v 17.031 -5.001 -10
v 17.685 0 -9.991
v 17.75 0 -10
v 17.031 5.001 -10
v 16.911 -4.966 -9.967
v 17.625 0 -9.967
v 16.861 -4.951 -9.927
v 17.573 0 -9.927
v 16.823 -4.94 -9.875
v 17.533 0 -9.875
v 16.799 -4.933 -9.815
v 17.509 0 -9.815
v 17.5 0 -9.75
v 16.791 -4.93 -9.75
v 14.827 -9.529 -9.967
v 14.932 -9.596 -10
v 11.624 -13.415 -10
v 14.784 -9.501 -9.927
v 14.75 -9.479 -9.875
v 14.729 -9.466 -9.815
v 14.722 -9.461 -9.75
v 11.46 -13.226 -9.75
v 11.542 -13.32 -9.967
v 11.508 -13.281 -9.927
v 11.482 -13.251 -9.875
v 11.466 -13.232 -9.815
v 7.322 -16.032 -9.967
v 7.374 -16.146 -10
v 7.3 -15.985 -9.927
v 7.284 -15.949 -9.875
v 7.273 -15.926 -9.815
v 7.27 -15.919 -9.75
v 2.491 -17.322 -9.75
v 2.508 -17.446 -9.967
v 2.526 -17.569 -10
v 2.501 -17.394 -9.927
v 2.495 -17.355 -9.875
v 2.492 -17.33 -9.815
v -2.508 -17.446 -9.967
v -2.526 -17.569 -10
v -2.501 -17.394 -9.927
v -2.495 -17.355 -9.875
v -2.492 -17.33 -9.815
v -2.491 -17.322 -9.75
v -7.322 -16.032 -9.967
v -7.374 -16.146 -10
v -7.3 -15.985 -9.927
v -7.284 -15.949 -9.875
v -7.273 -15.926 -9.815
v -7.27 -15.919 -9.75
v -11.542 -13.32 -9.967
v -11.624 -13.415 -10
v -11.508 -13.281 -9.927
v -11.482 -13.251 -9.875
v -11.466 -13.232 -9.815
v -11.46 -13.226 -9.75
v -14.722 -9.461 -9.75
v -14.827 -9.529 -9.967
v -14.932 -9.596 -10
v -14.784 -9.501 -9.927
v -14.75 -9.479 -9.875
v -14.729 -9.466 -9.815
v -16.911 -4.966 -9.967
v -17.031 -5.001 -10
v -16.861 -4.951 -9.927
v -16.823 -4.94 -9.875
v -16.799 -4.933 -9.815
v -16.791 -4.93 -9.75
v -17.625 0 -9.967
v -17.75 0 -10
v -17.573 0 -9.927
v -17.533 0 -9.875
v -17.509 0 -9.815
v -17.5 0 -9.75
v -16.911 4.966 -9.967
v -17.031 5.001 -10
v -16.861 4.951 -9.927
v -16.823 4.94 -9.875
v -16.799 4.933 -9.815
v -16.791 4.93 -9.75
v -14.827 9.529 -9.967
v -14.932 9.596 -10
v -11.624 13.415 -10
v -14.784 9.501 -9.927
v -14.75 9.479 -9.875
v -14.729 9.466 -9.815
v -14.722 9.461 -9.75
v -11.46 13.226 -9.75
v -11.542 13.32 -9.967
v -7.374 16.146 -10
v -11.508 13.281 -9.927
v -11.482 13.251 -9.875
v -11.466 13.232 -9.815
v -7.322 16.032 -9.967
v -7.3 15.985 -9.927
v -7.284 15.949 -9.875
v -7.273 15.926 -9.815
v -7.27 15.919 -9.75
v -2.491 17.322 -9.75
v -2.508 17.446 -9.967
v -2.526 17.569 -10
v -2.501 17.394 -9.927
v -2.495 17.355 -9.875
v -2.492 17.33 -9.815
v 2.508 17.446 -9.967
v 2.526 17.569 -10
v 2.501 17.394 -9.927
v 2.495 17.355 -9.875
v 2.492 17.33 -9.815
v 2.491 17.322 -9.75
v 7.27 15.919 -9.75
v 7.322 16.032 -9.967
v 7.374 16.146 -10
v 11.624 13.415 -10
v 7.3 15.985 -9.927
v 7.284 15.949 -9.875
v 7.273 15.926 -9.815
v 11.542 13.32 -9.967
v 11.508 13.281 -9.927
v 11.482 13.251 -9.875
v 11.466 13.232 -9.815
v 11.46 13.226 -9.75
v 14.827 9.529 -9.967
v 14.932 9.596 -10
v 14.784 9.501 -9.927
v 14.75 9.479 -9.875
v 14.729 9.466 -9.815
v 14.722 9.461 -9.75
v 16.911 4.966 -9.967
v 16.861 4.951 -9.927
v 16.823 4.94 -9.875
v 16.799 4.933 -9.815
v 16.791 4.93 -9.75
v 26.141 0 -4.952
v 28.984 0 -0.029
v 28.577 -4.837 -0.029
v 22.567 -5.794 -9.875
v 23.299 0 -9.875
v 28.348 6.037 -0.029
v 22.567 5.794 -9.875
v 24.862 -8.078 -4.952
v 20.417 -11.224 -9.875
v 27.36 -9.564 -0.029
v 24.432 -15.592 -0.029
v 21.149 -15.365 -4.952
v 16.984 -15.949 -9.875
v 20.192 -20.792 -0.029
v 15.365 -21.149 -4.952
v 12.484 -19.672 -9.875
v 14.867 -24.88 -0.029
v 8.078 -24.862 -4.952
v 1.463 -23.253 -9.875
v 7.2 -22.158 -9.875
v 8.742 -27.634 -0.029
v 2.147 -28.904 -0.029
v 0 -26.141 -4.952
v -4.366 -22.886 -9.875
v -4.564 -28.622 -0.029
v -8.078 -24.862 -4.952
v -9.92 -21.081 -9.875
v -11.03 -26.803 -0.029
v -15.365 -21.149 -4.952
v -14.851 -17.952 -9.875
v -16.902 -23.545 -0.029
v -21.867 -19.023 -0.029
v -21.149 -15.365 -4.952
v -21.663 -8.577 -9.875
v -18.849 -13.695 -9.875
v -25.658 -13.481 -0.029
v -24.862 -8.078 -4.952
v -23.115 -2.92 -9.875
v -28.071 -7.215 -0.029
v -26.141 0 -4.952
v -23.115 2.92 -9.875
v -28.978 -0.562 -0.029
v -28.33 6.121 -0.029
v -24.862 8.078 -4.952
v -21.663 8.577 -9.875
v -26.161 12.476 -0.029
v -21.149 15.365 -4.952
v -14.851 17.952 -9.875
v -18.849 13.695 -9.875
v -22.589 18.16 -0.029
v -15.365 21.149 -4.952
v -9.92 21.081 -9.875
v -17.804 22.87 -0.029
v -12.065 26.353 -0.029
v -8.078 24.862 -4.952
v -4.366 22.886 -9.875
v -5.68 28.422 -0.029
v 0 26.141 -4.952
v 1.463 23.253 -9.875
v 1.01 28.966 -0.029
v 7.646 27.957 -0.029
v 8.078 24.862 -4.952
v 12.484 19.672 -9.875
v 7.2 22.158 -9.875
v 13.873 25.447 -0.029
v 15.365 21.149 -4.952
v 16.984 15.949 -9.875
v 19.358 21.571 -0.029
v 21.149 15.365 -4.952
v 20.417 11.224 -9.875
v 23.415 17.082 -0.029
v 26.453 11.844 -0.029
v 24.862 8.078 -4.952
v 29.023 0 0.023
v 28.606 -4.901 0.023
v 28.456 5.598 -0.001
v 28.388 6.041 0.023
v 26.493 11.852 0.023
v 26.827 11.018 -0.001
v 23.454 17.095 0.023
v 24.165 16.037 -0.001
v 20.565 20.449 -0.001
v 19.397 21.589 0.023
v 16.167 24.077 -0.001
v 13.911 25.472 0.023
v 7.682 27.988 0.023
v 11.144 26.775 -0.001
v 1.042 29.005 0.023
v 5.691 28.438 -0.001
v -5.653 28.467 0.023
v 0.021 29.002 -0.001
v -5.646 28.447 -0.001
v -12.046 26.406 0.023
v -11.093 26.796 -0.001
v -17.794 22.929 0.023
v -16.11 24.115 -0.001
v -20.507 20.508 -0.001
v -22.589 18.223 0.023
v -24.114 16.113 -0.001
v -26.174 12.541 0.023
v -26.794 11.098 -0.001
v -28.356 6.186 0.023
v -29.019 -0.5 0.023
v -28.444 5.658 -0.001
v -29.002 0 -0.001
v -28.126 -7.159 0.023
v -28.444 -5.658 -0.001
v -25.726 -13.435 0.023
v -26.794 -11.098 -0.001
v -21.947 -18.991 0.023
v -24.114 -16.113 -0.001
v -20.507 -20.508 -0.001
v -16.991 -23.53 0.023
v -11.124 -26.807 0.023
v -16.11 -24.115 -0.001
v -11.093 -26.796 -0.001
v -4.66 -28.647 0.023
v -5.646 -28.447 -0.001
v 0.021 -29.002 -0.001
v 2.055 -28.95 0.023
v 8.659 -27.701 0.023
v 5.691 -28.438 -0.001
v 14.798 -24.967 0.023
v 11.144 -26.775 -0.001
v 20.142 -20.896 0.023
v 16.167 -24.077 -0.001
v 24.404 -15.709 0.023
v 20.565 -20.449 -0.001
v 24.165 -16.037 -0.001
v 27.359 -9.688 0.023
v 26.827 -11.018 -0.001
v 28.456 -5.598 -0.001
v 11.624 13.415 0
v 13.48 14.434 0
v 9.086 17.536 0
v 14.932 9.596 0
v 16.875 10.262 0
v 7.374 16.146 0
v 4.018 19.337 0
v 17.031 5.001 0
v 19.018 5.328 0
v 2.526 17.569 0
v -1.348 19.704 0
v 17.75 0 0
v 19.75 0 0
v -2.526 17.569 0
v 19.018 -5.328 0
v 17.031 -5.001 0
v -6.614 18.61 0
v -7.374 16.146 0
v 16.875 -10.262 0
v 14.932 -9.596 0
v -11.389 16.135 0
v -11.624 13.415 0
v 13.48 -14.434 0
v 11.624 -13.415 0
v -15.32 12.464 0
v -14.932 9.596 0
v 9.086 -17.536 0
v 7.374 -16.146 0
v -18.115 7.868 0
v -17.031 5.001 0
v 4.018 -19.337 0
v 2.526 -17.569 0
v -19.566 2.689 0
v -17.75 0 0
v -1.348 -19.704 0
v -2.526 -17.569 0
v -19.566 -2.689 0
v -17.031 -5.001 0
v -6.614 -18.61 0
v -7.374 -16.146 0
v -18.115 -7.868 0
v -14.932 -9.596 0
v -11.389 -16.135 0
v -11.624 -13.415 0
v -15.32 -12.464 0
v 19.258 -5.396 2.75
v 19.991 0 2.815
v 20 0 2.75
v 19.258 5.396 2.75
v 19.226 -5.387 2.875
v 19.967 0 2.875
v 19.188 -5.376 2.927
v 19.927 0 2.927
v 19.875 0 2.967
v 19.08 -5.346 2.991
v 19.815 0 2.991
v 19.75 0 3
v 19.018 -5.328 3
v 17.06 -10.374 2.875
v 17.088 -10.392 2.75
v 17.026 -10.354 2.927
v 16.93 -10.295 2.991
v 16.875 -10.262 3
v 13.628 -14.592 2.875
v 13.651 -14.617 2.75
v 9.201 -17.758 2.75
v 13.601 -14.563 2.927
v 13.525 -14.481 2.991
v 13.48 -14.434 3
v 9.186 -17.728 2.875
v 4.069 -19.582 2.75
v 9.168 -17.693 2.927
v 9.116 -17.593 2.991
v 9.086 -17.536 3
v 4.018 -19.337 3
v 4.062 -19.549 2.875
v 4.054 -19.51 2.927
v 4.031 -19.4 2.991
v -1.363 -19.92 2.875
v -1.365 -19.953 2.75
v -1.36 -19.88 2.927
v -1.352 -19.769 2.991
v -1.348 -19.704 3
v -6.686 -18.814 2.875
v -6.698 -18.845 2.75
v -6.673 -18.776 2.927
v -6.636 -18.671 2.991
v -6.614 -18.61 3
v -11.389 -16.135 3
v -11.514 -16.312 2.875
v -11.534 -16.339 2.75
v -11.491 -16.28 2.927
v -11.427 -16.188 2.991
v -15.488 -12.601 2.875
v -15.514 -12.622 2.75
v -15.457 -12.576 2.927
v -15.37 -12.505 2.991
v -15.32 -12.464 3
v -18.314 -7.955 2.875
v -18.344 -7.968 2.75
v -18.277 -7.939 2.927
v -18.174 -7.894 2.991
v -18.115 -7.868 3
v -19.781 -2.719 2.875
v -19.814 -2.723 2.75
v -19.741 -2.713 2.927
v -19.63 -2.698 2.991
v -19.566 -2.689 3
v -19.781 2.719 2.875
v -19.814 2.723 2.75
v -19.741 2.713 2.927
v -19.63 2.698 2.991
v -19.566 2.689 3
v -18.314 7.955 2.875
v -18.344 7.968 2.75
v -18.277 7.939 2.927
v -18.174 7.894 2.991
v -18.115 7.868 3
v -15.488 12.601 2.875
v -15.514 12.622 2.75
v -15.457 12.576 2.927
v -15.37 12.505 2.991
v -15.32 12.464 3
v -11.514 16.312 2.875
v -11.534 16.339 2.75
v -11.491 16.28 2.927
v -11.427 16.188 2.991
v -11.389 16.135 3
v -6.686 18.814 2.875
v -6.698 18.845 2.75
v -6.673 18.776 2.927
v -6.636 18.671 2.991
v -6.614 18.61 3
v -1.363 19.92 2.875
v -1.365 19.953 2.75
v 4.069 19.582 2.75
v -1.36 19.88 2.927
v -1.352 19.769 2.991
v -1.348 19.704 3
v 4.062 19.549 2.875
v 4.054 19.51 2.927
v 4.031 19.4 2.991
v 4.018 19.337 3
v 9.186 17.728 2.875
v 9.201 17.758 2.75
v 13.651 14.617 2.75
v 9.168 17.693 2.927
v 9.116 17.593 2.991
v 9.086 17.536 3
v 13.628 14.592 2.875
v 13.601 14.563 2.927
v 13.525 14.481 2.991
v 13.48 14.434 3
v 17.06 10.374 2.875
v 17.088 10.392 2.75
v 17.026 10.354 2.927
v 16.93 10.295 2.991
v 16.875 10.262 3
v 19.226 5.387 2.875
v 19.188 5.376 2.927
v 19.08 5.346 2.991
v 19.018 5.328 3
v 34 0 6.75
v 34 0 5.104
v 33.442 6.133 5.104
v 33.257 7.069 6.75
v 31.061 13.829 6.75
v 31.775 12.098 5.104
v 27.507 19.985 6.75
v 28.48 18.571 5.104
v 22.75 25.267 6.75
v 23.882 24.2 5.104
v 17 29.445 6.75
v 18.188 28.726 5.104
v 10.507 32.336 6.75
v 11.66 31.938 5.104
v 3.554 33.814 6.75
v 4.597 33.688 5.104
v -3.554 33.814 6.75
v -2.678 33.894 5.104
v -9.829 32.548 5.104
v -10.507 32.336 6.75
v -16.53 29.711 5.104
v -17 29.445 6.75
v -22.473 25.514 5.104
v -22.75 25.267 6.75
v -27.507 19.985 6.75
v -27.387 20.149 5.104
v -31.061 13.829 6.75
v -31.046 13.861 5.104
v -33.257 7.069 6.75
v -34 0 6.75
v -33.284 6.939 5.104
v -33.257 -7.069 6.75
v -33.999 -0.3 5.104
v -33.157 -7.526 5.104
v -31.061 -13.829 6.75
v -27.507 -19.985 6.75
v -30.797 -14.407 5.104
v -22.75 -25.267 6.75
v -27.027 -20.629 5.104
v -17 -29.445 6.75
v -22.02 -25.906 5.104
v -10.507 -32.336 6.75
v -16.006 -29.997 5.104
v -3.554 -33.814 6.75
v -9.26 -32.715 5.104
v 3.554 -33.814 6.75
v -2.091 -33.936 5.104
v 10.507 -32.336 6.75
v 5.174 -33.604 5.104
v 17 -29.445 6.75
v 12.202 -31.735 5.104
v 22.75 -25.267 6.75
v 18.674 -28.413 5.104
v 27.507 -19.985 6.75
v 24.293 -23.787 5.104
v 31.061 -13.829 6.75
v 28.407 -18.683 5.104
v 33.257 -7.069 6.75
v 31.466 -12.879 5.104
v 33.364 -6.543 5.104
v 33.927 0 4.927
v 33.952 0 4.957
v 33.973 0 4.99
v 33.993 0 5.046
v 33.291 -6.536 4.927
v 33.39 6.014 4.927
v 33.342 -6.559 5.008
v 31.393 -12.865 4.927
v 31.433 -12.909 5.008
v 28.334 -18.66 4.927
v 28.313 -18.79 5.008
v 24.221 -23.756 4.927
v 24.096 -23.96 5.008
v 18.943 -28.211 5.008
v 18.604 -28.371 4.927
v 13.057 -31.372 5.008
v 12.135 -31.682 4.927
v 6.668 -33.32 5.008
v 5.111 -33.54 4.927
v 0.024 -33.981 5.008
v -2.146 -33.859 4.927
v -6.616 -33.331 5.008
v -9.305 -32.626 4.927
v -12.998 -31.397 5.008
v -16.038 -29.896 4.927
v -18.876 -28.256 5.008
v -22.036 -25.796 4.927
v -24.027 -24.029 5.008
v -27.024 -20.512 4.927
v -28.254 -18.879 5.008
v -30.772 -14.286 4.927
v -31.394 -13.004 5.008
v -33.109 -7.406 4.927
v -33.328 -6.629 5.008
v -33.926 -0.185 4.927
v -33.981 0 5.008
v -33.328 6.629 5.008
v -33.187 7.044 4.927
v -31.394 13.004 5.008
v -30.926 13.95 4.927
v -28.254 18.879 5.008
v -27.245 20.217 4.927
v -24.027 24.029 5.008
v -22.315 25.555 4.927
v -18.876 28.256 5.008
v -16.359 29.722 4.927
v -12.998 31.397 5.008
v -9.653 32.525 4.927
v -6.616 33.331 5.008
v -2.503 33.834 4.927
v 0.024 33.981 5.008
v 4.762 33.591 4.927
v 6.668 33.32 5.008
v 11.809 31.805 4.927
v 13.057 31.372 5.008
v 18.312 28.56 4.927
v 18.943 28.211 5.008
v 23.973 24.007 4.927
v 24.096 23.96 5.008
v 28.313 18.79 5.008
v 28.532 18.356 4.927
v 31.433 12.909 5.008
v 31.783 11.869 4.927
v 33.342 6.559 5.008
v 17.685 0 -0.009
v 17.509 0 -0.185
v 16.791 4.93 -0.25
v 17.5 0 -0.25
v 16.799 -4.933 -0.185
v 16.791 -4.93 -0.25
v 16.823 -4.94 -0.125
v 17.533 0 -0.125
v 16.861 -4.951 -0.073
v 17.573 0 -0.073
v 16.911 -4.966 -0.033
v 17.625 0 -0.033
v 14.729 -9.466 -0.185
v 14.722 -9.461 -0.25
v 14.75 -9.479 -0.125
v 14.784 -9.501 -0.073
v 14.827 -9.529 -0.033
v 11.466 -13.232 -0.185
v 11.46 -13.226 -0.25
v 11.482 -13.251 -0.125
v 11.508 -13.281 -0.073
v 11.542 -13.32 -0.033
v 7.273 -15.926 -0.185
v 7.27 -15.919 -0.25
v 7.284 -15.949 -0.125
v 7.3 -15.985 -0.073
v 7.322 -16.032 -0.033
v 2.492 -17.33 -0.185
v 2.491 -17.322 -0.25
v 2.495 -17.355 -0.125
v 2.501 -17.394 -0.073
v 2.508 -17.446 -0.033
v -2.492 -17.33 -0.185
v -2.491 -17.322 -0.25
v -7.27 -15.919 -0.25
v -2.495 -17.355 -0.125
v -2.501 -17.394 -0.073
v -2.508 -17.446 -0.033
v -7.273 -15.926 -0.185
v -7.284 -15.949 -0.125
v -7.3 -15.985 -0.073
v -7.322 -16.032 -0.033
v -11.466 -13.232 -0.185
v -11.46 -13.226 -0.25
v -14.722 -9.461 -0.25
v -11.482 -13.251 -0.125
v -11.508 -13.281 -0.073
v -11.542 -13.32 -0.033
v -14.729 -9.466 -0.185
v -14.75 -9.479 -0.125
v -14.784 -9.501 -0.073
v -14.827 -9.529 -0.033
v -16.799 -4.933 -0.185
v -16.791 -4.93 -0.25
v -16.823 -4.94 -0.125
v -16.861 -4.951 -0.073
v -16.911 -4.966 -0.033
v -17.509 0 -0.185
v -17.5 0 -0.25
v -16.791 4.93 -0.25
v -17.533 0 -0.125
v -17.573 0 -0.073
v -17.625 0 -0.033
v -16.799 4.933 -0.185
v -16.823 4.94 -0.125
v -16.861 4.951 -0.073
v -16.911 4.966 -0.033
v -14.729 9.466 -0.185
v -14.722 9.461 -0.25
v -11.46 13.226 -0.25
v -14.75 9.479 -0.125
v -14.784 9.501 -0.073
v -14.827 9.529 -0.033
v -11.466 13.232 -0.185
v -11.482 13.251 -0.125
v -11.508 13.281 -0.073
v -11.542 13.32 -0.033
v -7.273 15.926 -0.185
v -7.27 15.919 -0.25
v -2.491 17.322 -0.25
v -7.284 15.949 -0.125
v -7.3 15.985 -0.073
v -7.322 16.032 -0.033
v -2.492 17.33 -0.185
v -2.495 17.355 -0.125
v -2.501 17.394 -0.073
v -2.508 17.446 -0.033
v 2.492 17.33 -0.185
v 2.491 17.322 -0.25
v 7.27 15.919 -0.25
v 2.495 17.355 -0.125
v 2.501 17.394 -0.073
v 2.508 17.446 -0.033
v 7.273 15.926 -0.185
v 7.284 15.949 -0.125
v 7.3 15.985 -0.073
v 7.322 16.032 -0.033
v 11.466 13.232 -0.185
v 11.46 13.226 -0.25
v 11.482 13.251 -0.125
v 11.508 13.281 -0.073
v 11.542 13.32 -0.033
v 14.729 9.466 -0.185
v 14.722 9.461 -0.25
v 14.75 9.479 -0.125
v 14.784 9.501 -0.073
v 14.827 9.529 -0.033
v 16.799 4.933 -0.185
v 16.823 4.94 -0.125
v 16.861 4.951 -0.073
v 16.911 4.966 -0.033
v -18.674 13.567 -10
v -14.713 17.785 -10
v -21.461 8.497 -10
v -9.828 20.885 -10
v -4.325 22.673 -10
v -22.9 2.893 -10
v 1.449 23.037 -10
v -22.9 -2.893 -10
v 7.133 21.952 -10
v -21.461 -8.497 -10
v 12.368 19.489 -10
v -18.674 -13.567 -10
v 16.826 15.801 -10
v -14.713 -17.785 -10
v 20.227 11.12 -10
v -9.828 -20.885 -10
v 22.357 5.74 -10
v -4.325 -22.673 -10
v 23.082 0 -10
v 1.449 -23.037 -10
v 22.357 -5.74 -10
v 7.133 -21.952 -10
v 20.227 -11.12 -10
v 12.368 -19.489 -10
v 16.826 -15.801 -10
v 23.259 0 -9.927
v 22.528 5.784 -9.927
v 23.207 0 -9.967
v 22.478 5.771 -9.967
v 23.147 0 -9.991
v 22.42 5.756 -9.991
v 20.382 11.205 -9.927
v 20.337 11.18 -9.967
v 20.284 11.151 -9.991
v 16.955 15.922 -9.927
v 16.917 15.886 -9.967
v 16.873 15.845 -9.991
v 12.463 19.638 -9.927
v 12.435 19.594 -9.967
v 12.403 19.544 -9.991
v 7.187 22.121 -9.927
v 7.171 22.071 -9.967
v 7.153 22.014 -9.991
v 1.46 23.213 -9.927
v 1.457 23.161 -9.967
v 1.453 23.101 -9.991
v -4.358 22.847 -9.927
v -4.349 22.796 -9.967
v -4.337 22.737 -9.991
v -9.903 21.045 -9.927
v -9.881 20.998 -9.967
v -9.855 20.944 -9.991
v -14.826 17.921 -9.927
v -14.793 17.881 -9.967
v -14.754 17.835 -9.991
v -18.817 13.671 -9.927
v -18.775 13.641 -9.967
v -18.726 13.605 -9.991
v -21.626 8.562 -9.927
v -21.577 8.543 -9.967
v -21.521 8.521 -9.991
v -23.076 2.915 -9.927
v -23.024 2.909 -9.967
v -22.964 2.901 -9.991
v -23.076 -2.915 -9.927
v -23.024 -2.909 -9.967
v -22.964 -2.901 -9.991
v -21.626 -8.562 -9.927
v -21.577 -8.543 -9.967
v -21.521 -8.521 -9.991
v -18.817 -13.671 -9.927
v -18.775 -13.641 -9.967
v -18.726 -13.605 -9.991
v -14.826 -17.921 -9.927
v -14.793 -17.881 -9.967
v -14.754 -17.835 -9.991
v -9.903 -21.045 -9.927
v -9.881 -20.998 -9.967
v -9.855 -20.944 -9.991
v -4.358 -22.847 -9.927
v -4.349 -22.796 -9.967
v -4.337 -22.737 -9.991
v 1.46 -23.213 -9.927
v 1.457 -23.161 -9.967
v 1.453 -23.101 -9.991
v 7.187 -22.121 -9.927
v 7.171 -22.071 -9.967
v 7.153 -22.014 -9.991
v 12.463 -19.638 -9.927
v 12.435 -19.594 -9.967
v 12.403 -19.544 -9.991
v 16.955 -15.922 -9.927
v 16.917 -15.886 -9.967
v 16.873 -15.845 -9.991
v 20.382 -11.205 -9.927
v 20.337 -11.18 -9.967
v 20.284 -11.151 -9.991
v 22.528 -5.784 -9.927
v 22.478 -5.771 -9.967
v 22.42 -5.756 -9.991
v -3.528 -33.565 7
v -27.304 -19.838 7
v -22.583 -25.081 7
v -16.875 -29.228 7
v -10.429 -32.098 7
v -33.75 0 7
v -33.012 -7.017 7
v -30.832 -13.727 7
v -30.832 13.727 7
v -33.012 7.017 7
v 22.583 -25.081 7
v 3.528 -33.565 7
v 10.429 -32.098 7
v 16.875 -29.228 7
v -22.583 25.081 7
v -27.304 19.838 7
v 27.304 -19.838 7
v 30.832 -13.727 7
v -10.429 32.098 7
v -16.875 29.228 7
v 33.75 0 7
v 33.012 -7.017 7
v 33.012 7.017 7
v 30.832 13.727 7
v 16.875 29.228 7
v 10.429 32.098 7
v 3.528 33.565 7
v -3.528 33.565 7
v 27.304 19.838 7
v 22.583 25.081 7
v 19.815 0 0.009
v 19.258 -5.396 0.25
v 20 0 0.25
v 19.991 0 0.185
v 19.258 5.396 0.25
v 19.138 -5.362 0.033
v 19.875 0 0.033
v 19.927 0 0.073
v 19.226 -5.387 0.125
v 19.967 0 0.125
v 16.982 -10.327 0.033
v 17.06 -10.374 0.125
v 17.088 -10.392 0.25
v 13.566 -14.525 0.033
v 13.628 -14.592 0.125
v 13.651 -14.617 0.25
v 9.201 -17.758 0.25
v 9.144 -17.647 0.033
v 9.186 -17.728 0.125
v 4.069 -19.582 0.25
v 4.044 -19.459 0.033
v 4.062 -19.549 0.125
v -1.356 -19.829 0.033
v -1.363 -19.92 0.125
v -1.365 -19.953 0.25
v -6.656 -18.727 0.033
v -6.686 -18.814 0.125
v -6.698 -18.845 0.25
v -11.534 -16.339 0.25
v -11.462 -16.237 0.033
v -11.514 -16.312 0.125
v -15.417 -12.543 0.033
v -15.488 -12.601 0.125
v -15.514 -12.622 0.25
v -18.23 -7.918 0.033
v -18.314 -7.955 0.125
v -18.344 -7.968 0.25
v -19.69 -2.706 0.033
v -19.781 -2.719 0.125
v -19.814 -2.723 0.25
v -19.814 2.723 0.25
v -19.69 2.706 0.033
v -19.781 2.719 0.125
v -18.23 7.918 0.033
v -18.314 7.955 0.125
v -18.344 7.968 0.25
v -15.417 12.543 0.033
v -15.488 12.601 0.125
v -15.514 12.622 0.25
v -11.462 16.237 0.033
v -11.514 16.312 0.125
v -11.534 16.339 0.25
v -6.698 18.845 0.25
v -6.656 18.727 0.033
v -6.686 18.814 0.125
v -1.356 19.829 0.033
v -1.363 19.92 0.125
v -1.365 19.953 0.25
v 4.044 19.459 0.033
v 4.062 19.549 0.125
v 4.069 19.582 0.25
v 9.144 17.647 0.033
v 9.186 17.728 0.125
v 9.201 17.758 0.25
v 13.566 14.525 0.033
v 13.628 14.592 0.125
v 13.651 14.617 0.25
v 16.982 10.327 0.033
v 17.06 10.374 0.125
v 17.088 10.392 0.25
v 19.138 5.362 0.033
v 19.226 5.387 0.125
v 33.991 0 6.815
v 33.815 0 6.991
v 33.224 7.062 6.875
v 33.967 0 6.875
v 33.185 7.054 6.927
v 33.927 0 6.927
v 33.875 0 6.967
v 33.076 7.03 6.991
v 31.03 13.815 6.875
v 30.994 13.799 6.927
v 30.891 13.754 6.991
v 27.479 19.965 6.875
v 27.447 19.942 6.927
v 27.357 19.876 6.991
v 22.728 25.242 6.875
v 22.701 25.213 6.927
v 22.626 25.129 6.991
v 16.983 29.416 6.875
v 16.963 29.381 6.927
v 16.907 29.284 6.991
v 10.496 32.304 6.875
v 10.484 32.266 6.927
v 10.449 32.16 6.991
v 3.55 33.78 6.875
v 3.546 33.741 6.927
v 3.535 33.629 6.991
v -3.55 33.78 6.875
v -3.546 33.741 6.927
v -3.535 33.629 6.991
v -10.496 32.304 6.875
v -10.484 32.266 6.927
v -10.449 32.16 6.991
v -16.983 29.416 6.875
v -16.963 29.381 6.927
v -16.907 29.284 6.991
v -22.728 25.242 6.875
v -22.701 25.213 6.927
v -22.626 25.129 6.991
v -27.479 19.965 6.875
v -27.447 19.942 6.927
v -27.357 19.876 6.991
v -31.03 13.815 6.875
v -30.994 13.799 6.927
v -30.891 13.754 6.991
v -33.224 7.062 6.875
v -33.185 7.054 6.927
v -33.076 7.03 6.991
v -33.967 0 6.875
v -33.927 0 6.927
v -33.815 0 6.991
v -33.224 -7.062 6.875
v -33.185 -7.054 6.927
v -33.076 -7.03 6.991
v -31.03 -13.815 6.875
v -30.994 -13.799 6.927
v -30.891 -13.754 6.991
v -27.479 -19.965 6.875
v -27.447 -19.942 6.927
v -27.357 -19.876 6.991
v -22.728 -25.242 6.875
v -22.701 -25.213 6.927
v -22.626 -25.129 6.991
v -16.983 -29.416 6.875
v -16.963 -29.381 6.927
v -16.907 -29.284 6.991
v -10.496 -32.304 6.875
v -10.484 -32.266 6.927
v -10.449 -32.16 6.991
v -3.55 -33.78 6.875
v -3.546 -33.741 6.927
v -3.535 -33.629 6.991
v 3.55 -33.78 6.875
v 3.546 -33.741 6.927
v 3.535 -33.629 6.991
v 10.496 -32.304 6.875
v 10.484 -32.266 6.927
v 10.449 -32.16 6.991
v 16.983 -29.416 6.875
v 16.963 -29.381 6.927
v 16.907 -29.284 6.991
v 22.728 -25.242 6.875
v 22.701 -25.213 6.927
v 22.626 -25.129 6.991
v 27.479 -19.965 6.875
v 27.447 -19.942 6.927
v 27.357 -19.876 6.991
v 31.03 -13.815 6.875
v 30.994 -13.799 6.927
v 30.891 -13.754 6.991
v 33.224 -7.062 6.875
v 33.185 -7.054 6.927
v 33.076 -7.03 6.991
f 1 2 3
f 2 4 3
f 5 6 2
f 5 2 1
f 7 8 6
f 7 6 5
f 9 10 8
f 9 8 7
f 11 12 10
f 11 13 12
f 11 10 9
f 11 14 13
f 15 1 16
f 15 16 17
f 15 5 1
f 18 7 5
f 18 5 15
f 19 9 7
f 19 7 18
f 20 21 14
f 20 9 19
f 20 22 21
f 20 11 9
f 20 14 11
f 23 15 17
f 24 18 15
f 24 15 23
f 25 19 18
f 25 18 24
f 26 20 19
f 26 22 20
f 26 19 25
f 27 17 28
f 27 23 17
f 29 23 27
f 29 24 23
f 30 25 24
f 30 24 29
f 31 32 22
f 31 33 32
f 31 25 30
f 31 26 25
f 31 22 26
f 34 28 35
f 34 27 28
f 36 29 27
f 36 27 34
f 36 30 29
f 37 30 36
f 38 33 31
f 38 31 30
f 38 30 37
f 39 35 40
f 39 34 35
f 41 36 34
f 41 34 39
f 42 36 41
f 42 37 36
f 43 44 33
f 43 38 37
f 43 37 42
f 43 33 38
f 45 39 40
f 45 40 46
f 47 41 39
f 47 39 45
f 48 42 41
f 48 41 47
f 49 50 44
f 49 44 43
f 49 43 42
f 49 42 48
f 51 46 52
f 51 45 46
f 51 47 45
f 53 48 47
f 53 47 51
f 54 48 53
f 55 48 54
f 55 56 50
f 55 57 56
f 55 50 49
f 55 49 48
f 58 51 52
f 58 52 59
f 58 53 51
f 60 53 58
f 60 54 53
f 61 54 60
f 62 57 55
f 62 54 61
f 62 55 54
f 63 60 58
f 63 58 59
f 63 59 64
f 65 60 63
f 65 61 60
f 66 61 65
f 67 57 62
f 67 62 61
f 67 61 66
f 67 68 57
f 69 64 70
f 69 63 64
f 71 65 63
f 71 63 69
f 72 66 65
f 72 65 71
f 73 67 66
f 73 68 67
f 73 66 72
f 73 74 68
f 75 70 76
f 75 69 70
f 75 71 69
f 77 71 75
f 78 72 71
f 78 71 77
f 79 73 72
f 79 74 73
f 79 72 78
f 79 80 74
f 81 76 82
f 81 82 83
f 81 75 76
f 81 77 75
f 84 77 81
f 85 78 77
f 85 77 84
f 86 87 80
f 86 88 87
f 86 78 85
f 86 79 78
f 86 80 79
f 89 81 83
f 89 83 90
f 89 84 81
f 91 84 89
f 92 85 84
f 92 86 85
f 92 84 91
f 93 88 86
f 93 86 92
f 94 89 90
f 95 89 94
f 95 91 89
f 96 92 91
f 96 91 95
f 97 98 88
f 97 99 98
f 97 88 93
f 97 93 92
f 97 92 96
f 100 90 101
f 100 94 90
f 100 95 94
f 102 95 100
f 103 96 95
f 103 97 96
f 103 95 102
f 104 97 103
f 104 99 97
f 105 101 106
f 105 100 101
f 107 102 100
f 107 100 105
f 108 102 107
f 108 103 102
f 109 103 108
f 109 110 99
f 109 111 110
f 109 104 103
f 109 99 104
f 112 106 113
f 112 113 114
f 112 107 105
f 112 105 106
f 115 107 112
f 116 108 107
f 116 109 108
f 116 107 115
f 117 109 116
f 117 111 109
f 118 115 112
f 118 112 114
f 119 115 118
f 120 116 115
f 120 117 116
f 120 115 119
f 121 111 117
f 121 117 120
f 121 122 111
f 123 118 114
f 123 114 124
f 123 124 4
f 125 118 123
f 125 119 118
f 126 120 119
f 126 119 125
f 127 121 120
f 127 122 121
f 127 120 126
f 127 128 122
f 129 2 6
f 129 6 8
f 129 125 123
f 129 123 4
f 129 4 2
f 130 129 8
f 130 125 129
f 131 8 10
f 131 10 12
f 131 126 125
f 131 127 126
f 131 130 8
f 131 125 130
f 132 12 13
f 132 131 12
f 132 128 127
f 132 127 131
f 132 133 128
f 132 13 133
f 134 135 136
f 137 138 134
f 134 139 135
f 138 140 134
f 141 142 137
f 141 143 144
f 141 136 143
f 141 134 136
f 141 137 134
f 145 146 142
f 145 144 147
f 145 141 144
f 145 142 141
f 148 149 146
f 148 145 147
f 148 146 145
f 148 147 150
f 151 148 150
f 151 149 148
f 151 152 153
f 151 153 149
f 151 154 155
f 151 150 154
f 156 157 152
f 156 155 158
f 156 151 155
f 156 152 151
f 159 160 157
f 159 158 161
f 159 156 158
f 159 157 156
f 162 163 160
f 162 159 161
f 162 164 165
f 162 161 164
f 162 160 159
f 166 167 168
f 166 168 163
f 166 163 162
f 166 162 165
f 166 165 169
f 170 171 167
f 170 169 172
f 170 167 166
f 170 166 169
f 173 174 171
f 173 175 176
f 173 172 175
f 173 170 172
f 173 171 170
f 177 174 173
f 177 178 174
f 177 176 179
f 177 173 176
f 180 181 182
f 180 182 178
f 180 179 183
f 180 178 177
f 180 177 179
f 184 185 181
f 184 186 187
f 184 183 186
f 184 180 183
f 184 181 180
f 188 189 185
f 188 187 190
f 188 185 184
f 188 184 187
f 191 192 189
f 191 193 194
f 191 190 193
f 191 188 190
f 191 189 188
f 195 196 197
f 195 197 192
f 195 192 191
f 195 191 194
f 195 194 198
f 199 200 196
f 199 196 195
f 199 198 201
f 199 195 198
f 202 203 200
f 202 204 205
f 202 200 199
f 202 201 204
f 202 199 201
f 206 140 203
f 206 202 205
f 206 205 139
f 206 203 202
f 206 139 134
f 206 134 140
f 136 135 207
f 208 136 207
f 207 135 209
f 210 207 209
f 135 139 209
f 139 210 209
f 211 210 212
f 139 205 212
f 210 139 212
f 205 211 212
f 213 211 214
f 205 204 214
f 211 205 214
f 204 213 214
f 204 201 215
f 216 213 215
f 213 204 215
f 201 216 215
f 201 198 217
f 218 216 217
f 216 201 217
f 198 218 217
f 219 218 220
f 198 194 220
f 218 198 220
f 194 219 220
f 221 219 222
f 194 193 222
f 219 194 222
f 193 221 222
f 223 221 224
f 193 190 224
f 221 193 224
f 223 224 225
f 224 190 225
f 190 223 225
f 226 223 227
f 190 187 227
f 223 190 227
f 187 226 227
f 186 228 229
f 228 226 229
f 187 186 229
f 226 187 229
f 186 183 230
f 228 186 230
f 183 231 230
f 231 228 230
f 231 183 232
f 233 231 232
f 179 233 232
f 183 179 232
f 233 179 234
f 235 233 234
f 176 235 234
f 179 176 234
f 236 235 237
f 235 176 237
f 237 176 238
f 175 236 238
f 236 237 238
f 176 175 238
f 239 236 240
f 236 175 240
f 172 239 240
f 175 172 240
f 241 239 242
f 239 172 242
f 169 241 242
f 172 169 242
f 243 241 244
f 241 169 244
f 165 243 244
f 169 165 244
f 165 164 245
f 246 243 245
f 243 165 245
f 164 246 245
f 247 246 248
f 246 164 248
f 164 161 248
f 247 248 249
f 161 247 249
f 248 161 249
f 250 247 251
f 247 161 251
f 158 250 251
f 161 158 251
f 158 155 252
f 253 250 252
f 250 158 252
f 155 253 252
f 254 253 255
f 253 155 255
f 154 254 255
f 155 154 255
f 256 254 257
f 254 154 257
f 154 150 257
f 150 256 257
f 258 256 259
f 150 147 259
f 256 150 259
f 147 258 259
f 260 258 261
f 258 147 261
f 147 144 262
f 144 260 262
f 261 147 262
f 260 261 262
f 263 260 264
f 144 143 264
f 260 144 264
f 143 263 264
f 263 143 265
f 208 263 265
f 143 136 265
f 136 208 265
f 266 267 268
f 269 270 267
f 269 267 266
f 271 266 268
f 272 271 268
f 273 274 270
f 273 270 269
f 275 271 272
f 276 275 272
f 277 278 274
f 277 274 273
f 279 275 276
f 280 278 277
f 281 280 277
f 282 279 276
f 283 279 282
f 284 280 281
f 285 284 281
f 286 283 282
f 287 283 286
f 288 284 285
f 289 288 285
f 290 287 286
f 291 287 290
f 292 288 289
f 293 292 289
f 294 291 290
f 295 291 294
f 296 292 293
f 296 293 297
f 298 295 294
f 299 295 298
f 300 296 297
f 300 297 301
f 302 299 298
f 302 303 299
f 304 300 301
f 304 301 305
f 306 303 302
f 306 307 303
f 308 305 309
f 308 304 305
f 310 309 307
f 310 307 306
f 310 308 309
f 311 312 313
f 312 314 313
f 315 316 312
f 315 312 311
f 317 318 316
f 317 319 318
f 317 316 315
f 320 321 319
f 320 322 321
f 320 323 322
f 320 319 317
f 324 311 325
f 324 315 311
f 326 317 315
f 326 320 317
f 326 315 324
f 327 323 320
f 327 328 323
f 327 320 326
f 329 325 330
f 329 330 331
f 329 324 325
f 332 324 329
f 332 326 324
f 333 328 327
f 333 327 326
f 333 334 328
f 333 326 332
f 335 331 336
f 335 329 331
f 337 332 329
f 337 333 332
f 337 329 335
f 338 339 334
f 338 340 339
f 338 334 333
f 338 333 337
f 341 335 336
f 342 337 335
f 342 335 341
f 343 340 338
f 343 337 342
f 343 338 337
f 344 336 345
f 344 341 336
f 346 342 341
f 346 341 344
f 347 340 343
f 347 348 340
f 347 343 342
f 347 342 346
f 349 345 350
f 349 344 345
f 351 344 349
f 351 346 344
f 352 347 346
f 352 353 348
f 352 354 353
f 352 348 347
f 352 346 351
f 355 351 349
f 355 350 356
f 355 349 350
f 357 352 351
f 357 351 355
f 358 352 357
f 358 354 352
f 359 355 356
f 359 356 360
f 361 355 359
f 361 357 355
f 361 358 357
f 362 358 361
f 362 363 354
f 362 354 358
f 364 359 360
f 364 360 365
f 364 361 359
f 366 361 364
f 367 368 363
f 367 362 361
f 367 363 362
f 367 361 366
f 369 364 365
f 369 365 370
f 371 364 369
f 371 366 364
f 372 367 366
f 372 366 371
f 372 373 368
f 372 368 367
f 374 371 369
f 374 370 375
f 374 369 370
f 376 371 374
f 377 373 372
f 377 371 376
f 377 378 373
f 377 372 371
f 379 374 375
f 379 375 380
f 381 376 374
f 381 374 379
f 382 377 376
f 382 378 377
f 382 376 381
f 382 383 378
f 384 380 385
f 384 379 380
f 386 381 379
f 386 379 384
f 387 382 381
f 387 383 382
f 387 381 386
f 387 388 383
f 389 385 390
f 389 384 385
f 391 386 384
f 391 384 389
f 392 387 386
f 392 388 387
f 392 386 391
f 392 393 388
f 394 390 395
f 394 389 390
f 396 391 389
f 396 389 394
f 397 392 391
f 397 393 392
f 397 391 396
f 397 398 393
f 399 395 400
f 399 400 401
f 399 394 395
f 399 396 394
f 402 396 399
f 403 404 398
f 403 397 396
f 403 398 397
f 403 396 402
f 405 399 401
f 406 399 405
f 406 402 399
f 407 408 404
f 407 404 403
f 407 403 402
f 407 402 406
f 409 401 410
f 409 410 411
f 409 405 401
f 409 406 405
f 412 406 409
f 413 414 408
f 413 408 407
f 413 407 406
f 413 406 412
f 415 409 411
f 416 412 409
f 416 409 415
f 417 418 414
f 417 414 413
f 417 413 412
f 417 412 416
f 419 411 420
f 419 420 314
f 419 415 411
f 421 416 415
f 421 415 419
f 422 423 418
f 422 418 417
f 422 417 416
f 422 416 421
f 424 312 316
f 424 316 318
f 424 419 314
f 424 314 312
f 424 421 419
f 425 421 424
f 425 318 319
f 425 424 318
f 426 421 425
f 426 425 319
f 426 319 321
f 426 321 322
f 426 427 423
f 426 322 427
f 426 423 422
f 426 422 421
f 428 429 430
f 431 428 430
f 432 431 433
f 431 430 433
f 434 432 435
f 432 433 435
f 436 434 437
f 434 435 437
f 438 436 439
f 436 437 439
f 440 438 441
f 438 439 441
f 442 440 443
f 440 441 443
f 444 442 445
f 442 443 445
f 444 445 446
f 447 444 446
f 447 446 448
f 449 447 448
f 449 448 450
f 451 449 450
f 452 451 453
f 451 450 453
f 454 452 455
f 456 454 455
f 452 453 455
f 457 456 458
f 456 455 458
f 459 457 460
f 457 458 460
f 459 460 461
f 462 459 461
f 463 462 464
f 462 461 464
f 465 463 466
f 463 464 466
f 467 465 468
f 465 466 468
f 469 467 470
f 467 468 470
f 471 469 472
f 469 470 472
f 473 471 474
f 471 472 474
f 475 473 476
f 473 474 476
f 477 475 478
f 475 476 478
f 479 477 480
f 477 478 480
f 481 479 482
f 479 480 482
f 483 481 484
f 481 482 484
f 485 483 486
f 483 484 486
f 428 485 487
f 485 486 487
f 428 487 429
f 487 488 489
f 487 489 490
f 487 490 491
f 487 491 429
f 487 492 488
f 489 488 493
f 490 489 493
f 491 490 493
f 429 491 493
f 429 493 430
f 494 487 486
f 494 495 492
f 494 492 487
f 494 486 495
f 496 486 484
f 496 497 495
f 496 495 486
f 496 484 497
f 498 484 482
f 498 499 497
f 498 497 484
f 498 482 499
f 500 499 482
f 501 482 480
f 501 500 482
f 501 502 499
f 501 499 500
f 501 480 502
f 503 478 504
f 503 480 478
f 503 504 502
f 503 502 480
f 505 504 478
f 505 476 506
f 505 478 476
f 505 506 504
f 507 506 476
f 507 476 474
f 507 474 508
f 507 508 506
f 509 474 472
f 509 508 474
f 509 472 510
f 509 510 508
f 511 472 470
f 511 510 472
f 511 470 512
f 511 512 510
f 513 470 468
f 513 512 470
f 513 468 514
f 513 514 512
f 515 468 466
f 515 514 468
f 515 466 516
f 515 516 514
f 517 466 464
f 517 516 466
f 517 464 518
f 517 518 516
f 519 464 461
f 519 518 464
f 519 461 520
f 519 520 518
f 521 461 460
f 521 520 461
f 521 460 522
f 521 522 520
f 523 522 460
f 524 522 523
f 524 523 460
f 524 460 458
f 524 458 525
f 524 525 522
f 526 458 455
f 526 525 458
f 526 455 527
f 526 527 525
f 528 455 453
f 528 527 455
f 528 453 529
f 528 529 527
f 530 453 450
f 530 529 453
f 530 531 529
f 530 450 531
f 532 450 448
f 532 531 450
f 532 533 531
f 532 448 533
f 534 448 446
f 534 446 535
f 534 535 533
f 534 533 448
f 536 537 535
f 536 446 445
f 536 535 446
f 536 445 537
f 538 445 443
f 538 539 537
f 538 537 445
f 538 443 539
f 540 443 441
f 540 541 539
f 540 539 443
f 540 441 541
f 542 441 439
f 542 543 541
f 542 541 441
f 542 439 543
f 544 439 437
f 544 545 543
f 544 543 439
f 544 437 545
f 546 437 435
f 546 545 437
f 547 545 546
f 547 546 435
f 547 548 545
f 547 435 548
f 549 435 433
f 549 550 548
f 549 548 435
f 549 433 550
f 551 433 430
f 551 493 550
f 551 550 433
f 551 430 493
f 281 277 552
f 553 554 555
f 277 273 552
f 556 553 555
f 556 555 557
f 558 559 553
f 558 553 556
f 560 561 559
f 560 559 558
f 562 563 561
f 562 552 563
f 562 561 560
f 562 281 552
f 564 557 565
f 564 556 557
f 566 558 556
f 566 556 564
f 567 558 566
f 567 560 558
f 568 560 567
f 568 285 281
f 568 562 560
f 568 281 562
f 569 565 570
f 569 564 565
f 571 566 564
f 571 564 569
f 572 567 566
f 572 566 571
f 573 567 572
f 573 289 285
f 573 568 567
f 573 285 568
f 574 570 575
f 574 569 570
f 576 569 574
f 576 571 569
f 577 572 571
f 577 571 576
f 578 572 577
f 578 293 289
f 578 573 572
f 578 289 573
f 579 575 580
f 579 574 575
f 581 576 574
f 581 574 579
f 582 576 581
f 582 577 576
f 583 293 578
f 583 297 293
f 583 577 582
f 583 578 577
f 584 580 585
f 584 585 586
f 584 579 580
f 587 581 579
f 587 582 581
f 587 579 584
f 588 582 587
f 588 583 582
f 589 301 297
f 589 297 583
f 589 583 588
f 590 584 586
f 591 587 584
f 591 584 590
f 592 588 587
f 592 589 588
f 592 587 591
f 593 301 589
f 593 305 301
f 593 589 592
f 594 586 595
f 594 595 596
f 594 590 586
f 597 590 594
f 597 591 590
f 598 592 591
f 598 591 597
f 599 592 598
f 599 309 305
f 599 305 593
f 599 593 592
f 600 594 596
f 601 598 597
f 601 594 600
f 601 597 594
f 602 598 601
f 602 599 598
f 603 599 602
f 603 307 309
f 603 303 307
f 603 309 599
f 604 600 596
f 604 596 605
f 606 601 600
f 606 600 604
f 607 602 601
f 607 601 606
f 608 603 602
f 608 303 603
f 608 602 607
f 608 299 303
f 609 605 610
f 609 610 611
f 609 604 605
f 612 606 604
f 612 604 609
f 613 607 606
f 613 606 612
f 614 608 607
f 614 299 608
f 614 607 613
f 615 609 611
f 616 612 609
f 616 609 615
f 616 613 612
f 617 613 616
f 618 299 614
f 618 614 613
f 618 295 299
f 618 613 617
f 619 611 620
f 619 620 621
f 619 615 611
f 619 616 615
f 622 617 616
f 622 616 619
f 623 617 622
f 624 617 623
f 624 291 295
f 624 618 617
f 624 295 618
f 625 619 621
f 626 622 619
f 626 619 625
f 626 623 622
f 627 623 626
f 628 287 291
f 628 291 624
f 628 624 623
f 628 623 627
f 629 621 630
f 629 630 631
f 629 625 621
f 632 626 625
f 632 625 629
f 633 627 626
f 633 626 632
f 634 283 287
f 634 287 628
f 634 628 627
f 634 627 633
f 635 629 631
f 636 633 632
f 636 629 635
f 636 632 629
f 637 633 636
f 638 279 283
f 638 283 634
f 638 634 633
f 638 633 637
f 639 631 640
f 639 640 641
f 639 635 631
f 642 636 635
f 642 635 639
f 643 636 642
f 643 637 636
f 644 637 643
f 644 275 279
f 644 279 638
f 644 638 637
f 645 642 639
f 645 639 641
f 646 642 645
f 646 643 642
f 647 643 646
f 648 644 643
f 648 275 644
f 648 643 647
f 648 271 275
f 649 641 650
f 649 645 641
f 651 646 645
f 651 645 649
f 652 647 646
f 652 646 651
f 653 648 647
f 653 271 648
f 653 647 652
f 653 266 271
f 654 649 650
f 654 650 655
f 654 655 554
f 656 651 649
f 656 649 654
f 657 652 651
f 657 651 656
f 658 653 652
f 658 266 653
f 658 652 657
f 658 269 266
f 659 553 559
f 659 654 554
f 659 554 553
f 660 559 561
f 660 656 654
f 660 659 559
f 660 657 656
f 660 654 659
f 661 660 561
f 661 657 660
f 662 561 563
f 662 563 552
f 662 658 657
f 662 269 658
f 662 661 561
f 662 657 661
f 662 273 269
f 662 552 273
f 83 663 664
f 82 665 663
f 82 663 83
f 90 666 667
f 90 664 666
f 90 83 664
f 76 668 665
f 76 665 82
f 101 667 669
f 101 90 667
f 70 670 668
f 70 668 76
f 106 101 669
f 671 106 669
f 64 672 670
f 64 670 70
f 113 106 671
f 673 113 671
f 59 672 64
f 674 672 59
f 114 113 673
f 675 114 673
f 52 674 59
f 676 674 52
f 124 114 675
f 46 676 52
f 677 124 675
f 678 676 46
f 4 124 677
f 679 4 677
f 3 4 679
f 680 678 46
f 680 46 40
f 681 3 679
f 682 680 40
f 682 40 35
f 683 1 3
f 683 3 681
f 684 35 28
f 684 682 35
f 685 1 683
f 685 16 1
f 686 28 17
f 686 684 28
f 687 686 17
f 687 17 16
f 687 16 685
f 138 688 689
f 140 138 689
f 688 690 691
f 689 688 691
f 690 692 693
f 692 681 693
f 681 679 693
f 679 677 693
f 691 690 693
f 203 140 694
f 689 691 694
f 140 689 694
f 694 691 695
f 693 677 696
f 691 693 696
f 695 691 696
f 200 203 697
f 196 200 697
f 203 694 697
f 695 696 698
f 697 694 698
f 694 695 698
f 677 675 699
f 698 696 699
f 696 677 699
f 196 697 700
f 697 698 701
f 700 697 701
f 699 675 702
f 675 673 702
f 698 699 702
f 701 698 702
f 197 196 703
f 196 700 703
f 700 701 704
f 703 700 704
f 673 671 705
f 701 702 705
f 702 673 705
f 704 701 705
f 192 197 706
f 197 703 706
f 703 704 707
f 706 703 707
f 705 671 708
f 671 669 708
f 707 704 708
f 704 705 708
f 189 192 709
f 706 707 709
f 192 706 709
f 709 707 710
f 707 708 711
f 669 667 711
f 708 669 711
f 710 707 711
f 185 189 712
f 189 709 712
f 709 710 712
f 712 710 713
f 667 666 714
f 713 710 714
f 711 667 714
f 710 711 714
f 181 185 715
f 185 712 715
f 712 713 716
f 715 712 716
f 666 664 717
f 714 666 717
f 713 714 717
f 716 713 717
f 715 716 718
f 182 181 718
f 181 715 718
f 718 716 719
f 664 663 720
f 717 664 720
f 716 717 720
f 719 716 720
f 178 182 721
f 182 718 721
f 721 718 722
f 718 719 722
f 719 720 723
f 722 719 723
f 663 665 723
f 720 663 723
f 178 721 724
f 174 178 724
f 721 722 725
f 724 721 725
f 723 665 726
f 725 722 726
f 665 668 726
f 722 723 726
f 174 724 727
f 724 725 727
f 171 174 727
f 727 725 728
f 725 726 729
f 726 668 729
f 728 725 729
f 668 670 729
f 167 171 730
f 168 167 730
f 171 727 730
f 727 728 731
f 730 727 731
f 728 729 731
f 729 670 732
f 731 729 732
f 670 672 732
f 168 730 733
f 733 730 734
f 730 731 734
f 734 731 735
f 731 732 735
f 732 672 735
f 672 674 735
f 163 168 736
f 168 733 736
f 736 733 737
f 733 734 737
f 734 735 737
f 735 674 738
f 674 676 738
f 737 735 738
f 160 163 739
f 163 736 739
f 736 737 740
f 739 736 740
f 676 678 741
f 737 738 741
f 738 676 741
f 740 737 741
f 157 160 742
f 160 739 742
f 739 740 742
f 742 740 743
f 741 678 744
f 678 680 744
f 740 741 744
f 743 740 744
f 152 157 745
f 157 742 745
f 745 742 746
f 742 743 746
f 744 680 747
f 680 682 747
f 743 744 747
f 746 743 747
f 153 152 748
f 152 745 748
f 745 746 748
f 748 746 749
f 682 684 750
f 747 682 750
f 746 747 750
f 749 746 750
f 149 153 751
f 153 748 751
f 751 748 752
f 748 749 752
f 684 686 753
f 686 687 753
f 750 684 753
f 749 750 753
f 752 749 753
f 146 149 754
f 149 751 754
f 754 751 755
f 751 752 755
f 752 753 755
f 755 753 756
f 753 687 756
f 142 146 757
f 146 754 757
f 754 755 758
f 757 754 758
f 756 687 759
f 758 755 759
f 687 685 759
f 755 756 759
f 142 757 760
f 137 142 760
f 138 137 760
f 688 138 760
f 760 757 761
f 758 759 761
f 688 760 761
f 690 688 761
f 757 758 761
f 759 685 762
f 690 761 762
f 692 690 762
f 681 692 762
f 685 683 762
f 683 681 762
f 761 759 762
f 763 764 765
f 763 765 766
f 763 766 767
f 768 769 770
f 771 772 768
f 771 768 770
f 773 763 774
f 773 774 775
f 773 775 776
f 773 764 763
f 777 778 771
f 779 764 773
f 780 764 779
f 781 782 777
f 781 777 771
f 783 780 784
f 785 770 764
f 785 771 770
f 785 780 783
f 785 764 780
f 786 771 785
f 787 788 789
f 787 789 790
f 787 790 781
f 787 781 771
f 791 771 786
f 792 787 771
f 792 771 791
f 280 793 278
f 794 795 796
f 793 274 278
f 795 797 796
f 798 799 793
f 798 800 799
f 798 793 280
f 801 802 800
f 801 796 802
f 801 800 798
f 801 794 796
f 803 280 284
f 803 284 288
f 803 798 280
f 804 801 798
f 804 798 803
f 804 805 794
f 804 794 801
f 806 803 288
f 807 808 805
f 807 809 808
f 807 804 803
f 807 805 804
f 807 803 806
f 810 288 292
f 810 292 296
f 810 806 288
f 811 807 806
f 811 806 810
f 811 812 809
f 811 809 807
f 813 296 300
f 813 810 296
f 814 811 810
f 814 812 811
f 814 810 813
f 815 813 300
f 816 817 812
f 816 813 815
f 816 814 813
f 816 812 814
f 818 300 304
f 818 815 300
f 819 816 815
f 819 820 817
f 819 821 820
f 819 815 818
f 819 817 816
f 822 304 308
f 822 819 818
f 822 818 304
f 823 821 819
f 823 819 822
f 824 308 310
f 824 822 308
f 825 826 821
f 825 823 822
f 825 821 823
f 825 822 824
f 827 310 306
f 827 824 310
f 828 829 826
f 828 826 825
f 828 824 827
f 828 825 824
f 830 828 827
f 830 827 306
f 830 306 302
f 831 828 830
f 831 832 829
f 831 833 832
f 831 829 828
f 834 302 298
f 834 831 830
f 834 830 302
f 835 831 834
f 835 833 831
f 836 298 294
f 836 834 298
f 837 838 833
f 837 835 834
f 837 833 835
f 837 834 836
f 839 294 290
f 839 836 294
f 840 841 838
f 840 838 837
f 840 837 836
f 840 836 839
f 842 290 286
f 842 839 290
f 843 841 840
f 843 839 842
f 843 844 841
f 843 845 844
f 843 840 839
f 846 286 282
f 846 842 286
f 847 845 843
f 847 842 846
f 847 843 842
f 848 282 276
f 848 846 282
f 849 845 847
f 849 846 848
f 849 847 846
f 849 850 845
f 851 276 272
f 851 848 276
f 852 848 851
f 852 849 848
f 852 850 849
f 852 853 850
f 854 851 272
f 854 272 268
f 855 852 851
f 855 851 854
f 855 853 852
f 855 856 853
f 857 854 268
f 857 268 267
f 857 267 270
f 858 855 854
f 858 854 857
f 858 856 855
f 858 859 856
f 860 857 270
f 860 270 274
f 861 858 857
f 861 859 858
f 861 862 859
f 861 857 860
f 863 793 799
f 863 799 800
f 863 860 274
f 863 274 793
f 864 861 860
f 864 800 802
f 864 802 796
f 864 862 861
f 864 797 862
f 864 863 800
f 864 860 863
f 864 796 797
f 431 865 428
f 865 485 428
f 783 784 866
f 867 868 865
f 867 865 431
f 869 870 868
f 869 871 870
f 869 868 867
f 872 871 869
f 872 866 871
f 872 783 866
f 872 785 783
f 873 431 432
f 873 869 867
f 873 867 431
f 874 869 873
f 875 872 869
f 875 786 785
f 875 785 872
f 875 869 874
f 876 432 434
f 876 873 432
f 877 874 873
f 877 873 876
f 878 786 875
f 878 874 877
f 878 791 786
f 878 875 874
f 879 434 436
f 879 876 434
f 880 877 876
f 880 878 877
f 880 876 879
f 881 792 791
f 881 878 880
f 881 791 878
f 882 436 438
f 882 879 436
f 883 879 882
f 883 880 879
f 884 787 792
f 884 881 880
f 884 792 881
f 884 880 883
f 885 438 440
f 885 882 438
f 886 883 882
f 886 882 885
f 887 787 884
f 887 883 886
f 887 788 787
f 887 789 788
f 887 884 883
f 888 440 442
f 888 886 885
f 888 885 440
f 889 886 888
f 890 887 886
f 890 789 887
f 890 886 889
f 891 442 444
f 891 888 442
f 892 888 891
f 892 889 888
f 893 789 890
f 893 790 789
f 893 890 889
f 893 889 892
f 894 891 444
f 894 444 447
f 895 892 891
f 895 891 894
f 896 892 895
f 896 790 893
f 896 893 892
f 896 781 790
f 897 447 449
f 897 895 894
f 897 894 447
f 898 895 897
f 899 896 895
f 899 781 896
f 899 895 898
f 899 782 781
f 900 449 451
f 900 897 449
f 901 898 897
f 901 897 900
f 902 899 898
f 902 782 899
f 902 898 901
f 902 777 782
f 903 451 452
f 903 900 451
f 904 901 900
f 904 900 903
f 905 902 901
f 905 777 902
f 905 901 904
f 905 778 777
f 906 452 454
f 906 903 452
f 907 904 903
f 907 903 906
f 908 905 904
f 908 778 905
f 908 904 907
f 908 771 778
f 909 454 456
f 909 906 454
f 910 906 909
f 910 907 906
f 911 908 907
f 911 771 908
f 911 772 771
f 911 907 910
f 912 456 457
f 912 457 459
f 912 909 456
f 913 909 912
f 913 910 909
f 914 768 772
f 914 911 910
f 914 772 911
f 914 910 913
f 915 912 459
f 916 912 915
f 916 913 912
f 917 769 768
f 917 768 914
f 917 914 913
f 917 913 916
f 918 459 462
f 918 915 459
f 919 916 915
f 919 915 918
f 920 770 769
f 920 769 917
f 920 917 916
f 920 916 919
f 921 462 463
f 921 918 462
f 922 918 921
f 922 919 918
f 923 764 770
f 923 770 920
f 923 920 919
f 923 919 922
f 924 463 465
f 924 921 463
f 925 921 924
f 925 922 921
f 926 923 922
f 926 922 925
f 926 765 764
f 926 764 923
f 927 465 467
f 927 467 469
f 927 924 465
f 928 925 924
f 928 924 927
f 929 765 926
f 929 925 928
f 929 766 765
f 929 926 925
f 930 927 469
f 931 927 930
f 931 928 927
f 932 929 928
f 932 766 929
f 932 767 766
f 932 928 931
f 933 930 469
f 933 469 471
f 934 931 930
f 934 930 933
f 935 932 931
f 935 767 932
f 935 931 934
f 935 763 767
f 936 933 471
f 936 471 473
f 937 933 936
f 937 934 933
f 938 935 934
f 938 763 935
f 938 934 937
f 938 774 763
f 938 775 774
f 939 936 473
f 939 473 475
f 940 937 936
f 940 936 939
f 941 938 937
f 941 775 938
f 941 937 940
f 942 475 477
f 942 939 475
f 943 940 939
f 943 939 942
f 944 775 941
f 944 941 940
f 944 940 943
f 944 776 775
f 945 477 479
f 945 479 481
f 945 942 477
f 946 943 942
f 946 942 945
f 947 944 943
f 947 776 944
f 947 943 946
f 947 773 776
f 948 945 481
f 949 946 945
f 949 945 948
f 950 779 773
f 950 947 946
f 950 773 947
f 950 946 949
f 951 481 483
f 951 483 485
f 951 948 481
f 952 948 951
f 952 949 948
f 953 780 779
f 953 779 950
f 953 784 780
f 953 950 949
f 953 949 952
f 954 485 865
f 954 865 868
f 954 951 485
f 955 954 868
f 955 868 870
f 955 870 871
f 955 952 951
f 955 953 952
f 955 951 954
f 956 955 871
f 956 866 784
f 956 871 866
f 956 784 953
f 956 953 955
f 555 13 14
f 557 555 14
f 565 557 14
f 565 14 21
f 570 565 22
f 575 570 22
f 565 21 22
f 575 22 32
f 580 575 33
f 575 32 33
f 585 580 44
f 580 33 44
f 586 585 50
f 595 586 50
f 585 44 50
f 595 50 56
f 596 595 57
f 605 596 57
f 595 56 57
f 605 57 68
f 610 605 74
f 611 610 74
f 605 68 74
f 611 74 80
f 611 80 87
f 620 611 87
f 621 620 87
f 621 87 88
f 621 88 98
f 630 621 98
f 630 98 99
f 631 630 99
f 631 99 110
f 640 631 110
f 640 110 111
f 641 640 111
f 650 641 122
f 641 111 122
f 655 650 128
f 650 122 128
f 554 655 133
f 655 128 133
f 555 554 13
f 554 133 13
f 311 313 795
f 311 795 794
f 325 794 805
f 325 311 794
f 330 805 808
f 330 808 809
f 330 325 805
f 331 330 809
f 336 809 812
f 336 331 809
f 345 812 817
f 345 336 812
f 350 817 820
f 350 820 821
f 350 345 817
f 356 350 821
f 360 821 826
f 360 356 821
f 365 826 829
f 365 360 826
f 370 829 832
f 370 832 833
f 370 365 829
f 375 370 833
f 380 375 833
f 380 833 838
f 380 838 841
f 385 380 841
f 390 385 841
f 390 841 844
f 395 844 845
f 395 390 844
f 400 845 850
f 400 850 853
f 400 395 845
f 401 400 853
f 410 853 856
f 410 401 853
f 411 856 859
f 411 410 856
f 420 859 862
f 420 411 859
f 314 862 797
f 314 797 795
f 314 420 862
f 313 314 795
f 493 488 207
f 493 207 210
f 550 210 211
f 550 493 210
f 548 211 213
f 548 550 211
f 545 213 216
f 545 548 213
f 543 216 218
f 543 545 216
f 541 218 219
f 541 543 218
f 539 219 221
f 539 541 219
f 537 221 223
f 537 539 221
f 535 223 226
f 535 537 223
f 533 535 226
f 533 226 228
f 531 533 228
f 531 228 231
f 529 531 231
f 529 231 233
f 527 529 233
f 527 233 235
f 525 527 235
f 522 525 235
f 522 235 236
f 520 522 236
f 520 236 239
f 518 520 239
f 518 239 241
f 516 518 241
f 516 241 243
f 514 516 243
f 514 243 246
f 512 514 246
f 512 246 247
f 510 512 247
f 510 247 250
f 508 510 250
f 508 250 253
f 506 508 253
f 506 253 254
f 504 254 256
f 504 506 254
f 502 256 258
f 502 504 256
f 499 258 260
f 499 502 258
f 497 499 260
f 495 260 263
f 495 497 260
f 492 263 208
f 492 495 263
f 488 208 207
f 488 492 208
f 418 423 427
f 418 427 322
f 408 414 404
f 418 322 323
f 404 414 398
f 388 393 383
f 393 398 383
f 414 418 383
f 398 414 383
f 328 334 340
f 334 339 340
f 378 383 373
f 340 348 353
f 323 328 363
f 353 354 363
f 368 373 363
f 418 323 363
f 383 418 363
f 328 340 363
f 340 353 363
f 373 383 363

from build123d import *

# Parameters (mm, degrees)
F0_R     = 29
F1_DEPTH = 5
F1_TAPER = -45
F2_R     = 34
F3_DEPTH = 2
F4_R     = 29
F5_DEPTH = 10
F5_TAPER = 30
F6_R     = 17.5
F7_DEPTH = 10
F8_W     = 20
F8_H     = 3
F10_R    = 0.25


with BuildPart() as f1:
    # F0 (on Top) → F1 (new body)
    with BuildSketch(Plane.XY):
        Circle(F0_R)
    extrude(amount=F1_DEPTH, taper=F1_TAPER)

    # F2 (on face) → F3 (join)
    with BuildSketch(Plane.XY.offset(5)):
        Circle(F2_R)
    extrude(amount=F3_DEPTH)

    # F4 (on face) → F5 (join)
    with BuildSketch(Plane(origin=(0, 0, 0), x_dir=(1, 0, 0), z_dir=(0, 0, -1))):
        Circle(F4_R)
    extrude(amount=F5_DEPTH, taper=F5_TAPER)

    # F6 (on face) → F7 (cut)
    with BuildSketch(Plane(origin=(0, 0, -10), x_dir=(1, 0, 0), z_dir=(0, 0, -1))):
        Circle(F6_R)
    extrude(amount=-F7_DEPTH, mode=Mode.SUBTRACT)

    # F8 (on Front) → F9 (revolve, cut)
    with BuildSketch(Plane.XZ):
        with Locations((10, 1.5)):
            Rectangle(F8_W, F8_H)
    revolve(axis=Axis((0, 0, -7.2614504024), (0, 0, -1)), mode=Mode.SUBTRACT)

    # F10
    f10_edges = [f1.edges().sort_by_distance(p)[0] for p in [
        (-29, 0, 0),
        (-34, 0, 7),
        (-17.5, 0, -10),
        (-34, 0, 5),
        (-23.226497, 0, -10),
        (-20, 0, 0),
        (-17.5, 0, 0),
        (-20, 0, 3),
    ]]
    fillet(f10_edges, radius=F10_R)


solid = f1.part
